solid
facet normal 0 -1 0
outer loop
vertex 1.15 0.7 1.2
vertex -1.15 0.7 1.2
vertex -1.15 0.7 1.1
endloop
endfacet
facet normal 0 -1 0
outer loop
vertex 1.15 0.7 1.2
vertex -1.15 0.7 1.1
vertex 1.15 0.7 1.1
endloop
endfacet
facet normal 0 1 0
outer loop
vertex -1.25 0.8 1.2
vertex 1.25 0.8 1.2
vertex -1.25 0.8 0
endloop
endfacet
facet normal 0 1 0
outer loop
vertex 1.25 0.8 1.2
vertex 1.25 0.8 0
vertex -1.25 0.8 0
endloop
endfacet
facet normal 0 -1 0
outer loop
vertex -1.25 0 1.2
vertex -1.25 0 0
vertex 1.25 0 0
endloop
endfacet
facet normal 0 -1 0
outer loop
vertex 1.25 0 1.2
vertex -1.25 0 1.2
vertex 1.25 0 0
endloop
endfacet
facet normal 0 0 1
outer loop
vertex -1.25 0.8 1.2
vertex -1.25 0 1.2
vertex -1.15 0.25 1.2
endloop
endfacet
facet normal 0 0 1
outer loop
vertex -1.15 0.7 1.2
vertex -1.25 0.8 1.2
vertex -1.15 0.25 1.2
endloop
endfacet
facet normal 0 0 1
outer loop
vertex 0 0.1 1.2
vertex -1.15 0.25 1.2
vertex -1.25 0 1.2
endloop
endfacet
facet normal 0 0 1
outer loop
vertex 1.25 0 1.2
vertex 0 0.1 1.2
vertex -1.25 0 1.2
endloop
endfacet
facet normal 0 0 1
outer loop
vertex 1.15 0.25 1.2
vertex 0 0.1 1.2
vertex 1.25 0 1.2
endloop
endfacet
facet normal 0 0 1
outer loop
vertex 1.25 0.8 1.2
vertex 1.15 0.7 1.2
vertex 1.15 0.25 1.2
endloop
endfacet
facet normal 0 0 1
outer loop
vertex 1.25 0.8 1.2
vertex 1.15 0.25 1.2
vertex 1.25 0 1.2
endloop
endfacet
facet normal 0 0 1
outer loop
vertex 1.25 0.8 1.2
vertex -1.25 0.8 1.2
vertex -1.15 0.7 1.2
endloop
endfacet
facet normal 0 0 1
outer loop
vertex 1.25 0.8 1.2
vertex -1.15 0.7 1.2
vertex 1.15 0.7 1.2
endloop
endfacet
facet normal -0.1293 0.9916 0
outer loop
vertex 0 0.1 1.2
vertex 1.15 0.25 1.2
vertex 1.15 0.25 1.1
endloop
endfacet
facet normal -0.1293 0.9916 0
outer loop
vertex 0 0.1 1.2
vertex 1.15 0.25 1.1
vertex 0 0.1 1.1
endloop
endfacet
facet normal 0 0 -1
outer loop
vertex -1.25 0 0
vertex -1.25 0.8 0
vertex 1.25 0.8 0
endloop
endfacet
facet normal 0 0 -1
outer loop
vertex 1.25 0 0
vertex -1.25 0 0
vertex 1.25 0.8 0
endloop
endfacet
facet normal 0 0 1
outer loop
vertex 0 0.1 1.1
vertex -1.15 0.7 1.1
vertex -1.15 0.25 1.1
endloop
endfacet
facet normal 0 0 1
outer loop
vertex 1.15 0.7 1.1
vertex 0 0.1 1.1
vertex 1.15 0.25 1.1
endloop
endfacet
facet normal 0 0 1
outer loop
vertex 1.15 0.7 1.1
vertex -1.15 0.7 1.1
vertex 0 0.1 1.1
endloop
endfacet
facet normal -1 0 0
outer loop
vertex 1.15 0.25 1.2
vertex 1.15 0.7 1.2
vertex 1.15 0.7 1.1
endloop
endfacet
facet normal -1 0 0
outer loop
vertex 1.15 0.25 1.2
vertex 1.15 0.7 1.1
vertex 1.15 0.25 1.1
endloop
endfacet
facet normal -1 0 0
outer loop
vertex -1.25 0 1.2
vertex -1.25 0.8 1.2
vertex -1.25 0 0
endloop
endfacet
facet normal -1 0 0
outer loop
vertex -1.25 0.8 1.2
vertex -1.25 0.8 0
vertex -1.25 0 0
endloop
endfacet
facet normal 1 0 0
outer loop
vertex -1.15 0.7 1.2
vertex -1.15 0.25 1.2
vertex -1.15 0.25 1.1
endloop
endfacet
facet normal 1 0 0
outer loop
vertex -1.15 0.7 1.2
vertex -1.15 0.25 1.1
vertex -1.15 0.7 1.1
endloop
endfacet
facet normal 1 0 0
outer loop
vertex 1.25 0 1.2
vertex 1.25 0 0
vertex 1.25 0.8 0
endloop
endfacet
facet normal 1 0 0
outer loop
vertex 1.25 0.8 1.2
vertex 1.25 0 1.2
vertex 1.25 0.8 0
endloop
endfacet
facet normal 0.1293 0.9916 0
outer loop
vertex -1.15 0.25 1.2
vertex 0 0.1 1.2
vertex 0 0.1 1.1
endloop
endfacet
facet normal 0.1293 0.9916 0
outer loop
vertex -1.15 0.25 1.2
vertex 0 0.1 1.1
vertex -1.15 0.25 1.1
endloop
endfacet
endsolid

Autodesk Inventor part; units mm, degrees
ref_plane "YZ Plane" through (0, 0, 0) normal (1, 0, 0) x (0, 1, 0)
ref_plane "XZ Plane" through (0, 0, 0) normal (0, 1, 0) x (-1, 0, 0)
ref_plane "XY Plane" through (0, 0, 0) normal (0, 0, 1) x (1, 0, 0)
sketch "Sketch1" plane through (0, 0, 0) normal (0, 0, 1) x (1, 0, 0)
  line L0 (-1.25, 0) -> (1.25, 0)
  line L1 (1.25, 0) -> (1.25, 0.8)
  line L2 (1.25, 0.8) -> (-1.25, 0.8)
  line L3 (-1.25, 0.8) -> (-1.25, 0)
  point P0 (0, 0)
  dimension "d0" = 2.5
  dimension "d1" = 1.25
  dimension "d2" = 0.8
extrude "Extrusion1" add sketch "Sketch1" along normal blind 1.2
sketch "Sketch2" plane through (0, 0, 1.2) normal (0, 0, 1) x (1, 0, 0)
  line L0 (-1.15, 0.7) -> (1.15, 0.7)
  line L1 (1.15, 0.7) -> (1.15, 0.25)
  line L2 (1.15, 0.25) -> (0, 0.1)
  line L3 (0, 0.1) -> (-1.15, 0.25)
  line L4 (-1.15, 0.25) -> (-1.15, 0.7)
  line L5 (-1.25, 0.8) -> (-1.25, 0) projected
  line L6 (1.25, 0) -> (1.25, 0.8) projected
  line L7 (1.25, 0.8) -> (-1.25, 0.8) projected
  point P0 (0, 0)
  dimension "d5" = 0.45
  dimension "d6" = 0.1
  dimension "d7" = 0.1
  dimension "d8" = 0.1
  dimension "d9" = 0.45
  dimension "d10" = 0.1
extrude "Extrusion2" cut sketch "Sketch2" against normal blind 0.1
equation "\"d1\" = 0.5 * d0"
equation "\"d9\" = d5"
properties part number "XGEN_LED-sidelooker_red"
